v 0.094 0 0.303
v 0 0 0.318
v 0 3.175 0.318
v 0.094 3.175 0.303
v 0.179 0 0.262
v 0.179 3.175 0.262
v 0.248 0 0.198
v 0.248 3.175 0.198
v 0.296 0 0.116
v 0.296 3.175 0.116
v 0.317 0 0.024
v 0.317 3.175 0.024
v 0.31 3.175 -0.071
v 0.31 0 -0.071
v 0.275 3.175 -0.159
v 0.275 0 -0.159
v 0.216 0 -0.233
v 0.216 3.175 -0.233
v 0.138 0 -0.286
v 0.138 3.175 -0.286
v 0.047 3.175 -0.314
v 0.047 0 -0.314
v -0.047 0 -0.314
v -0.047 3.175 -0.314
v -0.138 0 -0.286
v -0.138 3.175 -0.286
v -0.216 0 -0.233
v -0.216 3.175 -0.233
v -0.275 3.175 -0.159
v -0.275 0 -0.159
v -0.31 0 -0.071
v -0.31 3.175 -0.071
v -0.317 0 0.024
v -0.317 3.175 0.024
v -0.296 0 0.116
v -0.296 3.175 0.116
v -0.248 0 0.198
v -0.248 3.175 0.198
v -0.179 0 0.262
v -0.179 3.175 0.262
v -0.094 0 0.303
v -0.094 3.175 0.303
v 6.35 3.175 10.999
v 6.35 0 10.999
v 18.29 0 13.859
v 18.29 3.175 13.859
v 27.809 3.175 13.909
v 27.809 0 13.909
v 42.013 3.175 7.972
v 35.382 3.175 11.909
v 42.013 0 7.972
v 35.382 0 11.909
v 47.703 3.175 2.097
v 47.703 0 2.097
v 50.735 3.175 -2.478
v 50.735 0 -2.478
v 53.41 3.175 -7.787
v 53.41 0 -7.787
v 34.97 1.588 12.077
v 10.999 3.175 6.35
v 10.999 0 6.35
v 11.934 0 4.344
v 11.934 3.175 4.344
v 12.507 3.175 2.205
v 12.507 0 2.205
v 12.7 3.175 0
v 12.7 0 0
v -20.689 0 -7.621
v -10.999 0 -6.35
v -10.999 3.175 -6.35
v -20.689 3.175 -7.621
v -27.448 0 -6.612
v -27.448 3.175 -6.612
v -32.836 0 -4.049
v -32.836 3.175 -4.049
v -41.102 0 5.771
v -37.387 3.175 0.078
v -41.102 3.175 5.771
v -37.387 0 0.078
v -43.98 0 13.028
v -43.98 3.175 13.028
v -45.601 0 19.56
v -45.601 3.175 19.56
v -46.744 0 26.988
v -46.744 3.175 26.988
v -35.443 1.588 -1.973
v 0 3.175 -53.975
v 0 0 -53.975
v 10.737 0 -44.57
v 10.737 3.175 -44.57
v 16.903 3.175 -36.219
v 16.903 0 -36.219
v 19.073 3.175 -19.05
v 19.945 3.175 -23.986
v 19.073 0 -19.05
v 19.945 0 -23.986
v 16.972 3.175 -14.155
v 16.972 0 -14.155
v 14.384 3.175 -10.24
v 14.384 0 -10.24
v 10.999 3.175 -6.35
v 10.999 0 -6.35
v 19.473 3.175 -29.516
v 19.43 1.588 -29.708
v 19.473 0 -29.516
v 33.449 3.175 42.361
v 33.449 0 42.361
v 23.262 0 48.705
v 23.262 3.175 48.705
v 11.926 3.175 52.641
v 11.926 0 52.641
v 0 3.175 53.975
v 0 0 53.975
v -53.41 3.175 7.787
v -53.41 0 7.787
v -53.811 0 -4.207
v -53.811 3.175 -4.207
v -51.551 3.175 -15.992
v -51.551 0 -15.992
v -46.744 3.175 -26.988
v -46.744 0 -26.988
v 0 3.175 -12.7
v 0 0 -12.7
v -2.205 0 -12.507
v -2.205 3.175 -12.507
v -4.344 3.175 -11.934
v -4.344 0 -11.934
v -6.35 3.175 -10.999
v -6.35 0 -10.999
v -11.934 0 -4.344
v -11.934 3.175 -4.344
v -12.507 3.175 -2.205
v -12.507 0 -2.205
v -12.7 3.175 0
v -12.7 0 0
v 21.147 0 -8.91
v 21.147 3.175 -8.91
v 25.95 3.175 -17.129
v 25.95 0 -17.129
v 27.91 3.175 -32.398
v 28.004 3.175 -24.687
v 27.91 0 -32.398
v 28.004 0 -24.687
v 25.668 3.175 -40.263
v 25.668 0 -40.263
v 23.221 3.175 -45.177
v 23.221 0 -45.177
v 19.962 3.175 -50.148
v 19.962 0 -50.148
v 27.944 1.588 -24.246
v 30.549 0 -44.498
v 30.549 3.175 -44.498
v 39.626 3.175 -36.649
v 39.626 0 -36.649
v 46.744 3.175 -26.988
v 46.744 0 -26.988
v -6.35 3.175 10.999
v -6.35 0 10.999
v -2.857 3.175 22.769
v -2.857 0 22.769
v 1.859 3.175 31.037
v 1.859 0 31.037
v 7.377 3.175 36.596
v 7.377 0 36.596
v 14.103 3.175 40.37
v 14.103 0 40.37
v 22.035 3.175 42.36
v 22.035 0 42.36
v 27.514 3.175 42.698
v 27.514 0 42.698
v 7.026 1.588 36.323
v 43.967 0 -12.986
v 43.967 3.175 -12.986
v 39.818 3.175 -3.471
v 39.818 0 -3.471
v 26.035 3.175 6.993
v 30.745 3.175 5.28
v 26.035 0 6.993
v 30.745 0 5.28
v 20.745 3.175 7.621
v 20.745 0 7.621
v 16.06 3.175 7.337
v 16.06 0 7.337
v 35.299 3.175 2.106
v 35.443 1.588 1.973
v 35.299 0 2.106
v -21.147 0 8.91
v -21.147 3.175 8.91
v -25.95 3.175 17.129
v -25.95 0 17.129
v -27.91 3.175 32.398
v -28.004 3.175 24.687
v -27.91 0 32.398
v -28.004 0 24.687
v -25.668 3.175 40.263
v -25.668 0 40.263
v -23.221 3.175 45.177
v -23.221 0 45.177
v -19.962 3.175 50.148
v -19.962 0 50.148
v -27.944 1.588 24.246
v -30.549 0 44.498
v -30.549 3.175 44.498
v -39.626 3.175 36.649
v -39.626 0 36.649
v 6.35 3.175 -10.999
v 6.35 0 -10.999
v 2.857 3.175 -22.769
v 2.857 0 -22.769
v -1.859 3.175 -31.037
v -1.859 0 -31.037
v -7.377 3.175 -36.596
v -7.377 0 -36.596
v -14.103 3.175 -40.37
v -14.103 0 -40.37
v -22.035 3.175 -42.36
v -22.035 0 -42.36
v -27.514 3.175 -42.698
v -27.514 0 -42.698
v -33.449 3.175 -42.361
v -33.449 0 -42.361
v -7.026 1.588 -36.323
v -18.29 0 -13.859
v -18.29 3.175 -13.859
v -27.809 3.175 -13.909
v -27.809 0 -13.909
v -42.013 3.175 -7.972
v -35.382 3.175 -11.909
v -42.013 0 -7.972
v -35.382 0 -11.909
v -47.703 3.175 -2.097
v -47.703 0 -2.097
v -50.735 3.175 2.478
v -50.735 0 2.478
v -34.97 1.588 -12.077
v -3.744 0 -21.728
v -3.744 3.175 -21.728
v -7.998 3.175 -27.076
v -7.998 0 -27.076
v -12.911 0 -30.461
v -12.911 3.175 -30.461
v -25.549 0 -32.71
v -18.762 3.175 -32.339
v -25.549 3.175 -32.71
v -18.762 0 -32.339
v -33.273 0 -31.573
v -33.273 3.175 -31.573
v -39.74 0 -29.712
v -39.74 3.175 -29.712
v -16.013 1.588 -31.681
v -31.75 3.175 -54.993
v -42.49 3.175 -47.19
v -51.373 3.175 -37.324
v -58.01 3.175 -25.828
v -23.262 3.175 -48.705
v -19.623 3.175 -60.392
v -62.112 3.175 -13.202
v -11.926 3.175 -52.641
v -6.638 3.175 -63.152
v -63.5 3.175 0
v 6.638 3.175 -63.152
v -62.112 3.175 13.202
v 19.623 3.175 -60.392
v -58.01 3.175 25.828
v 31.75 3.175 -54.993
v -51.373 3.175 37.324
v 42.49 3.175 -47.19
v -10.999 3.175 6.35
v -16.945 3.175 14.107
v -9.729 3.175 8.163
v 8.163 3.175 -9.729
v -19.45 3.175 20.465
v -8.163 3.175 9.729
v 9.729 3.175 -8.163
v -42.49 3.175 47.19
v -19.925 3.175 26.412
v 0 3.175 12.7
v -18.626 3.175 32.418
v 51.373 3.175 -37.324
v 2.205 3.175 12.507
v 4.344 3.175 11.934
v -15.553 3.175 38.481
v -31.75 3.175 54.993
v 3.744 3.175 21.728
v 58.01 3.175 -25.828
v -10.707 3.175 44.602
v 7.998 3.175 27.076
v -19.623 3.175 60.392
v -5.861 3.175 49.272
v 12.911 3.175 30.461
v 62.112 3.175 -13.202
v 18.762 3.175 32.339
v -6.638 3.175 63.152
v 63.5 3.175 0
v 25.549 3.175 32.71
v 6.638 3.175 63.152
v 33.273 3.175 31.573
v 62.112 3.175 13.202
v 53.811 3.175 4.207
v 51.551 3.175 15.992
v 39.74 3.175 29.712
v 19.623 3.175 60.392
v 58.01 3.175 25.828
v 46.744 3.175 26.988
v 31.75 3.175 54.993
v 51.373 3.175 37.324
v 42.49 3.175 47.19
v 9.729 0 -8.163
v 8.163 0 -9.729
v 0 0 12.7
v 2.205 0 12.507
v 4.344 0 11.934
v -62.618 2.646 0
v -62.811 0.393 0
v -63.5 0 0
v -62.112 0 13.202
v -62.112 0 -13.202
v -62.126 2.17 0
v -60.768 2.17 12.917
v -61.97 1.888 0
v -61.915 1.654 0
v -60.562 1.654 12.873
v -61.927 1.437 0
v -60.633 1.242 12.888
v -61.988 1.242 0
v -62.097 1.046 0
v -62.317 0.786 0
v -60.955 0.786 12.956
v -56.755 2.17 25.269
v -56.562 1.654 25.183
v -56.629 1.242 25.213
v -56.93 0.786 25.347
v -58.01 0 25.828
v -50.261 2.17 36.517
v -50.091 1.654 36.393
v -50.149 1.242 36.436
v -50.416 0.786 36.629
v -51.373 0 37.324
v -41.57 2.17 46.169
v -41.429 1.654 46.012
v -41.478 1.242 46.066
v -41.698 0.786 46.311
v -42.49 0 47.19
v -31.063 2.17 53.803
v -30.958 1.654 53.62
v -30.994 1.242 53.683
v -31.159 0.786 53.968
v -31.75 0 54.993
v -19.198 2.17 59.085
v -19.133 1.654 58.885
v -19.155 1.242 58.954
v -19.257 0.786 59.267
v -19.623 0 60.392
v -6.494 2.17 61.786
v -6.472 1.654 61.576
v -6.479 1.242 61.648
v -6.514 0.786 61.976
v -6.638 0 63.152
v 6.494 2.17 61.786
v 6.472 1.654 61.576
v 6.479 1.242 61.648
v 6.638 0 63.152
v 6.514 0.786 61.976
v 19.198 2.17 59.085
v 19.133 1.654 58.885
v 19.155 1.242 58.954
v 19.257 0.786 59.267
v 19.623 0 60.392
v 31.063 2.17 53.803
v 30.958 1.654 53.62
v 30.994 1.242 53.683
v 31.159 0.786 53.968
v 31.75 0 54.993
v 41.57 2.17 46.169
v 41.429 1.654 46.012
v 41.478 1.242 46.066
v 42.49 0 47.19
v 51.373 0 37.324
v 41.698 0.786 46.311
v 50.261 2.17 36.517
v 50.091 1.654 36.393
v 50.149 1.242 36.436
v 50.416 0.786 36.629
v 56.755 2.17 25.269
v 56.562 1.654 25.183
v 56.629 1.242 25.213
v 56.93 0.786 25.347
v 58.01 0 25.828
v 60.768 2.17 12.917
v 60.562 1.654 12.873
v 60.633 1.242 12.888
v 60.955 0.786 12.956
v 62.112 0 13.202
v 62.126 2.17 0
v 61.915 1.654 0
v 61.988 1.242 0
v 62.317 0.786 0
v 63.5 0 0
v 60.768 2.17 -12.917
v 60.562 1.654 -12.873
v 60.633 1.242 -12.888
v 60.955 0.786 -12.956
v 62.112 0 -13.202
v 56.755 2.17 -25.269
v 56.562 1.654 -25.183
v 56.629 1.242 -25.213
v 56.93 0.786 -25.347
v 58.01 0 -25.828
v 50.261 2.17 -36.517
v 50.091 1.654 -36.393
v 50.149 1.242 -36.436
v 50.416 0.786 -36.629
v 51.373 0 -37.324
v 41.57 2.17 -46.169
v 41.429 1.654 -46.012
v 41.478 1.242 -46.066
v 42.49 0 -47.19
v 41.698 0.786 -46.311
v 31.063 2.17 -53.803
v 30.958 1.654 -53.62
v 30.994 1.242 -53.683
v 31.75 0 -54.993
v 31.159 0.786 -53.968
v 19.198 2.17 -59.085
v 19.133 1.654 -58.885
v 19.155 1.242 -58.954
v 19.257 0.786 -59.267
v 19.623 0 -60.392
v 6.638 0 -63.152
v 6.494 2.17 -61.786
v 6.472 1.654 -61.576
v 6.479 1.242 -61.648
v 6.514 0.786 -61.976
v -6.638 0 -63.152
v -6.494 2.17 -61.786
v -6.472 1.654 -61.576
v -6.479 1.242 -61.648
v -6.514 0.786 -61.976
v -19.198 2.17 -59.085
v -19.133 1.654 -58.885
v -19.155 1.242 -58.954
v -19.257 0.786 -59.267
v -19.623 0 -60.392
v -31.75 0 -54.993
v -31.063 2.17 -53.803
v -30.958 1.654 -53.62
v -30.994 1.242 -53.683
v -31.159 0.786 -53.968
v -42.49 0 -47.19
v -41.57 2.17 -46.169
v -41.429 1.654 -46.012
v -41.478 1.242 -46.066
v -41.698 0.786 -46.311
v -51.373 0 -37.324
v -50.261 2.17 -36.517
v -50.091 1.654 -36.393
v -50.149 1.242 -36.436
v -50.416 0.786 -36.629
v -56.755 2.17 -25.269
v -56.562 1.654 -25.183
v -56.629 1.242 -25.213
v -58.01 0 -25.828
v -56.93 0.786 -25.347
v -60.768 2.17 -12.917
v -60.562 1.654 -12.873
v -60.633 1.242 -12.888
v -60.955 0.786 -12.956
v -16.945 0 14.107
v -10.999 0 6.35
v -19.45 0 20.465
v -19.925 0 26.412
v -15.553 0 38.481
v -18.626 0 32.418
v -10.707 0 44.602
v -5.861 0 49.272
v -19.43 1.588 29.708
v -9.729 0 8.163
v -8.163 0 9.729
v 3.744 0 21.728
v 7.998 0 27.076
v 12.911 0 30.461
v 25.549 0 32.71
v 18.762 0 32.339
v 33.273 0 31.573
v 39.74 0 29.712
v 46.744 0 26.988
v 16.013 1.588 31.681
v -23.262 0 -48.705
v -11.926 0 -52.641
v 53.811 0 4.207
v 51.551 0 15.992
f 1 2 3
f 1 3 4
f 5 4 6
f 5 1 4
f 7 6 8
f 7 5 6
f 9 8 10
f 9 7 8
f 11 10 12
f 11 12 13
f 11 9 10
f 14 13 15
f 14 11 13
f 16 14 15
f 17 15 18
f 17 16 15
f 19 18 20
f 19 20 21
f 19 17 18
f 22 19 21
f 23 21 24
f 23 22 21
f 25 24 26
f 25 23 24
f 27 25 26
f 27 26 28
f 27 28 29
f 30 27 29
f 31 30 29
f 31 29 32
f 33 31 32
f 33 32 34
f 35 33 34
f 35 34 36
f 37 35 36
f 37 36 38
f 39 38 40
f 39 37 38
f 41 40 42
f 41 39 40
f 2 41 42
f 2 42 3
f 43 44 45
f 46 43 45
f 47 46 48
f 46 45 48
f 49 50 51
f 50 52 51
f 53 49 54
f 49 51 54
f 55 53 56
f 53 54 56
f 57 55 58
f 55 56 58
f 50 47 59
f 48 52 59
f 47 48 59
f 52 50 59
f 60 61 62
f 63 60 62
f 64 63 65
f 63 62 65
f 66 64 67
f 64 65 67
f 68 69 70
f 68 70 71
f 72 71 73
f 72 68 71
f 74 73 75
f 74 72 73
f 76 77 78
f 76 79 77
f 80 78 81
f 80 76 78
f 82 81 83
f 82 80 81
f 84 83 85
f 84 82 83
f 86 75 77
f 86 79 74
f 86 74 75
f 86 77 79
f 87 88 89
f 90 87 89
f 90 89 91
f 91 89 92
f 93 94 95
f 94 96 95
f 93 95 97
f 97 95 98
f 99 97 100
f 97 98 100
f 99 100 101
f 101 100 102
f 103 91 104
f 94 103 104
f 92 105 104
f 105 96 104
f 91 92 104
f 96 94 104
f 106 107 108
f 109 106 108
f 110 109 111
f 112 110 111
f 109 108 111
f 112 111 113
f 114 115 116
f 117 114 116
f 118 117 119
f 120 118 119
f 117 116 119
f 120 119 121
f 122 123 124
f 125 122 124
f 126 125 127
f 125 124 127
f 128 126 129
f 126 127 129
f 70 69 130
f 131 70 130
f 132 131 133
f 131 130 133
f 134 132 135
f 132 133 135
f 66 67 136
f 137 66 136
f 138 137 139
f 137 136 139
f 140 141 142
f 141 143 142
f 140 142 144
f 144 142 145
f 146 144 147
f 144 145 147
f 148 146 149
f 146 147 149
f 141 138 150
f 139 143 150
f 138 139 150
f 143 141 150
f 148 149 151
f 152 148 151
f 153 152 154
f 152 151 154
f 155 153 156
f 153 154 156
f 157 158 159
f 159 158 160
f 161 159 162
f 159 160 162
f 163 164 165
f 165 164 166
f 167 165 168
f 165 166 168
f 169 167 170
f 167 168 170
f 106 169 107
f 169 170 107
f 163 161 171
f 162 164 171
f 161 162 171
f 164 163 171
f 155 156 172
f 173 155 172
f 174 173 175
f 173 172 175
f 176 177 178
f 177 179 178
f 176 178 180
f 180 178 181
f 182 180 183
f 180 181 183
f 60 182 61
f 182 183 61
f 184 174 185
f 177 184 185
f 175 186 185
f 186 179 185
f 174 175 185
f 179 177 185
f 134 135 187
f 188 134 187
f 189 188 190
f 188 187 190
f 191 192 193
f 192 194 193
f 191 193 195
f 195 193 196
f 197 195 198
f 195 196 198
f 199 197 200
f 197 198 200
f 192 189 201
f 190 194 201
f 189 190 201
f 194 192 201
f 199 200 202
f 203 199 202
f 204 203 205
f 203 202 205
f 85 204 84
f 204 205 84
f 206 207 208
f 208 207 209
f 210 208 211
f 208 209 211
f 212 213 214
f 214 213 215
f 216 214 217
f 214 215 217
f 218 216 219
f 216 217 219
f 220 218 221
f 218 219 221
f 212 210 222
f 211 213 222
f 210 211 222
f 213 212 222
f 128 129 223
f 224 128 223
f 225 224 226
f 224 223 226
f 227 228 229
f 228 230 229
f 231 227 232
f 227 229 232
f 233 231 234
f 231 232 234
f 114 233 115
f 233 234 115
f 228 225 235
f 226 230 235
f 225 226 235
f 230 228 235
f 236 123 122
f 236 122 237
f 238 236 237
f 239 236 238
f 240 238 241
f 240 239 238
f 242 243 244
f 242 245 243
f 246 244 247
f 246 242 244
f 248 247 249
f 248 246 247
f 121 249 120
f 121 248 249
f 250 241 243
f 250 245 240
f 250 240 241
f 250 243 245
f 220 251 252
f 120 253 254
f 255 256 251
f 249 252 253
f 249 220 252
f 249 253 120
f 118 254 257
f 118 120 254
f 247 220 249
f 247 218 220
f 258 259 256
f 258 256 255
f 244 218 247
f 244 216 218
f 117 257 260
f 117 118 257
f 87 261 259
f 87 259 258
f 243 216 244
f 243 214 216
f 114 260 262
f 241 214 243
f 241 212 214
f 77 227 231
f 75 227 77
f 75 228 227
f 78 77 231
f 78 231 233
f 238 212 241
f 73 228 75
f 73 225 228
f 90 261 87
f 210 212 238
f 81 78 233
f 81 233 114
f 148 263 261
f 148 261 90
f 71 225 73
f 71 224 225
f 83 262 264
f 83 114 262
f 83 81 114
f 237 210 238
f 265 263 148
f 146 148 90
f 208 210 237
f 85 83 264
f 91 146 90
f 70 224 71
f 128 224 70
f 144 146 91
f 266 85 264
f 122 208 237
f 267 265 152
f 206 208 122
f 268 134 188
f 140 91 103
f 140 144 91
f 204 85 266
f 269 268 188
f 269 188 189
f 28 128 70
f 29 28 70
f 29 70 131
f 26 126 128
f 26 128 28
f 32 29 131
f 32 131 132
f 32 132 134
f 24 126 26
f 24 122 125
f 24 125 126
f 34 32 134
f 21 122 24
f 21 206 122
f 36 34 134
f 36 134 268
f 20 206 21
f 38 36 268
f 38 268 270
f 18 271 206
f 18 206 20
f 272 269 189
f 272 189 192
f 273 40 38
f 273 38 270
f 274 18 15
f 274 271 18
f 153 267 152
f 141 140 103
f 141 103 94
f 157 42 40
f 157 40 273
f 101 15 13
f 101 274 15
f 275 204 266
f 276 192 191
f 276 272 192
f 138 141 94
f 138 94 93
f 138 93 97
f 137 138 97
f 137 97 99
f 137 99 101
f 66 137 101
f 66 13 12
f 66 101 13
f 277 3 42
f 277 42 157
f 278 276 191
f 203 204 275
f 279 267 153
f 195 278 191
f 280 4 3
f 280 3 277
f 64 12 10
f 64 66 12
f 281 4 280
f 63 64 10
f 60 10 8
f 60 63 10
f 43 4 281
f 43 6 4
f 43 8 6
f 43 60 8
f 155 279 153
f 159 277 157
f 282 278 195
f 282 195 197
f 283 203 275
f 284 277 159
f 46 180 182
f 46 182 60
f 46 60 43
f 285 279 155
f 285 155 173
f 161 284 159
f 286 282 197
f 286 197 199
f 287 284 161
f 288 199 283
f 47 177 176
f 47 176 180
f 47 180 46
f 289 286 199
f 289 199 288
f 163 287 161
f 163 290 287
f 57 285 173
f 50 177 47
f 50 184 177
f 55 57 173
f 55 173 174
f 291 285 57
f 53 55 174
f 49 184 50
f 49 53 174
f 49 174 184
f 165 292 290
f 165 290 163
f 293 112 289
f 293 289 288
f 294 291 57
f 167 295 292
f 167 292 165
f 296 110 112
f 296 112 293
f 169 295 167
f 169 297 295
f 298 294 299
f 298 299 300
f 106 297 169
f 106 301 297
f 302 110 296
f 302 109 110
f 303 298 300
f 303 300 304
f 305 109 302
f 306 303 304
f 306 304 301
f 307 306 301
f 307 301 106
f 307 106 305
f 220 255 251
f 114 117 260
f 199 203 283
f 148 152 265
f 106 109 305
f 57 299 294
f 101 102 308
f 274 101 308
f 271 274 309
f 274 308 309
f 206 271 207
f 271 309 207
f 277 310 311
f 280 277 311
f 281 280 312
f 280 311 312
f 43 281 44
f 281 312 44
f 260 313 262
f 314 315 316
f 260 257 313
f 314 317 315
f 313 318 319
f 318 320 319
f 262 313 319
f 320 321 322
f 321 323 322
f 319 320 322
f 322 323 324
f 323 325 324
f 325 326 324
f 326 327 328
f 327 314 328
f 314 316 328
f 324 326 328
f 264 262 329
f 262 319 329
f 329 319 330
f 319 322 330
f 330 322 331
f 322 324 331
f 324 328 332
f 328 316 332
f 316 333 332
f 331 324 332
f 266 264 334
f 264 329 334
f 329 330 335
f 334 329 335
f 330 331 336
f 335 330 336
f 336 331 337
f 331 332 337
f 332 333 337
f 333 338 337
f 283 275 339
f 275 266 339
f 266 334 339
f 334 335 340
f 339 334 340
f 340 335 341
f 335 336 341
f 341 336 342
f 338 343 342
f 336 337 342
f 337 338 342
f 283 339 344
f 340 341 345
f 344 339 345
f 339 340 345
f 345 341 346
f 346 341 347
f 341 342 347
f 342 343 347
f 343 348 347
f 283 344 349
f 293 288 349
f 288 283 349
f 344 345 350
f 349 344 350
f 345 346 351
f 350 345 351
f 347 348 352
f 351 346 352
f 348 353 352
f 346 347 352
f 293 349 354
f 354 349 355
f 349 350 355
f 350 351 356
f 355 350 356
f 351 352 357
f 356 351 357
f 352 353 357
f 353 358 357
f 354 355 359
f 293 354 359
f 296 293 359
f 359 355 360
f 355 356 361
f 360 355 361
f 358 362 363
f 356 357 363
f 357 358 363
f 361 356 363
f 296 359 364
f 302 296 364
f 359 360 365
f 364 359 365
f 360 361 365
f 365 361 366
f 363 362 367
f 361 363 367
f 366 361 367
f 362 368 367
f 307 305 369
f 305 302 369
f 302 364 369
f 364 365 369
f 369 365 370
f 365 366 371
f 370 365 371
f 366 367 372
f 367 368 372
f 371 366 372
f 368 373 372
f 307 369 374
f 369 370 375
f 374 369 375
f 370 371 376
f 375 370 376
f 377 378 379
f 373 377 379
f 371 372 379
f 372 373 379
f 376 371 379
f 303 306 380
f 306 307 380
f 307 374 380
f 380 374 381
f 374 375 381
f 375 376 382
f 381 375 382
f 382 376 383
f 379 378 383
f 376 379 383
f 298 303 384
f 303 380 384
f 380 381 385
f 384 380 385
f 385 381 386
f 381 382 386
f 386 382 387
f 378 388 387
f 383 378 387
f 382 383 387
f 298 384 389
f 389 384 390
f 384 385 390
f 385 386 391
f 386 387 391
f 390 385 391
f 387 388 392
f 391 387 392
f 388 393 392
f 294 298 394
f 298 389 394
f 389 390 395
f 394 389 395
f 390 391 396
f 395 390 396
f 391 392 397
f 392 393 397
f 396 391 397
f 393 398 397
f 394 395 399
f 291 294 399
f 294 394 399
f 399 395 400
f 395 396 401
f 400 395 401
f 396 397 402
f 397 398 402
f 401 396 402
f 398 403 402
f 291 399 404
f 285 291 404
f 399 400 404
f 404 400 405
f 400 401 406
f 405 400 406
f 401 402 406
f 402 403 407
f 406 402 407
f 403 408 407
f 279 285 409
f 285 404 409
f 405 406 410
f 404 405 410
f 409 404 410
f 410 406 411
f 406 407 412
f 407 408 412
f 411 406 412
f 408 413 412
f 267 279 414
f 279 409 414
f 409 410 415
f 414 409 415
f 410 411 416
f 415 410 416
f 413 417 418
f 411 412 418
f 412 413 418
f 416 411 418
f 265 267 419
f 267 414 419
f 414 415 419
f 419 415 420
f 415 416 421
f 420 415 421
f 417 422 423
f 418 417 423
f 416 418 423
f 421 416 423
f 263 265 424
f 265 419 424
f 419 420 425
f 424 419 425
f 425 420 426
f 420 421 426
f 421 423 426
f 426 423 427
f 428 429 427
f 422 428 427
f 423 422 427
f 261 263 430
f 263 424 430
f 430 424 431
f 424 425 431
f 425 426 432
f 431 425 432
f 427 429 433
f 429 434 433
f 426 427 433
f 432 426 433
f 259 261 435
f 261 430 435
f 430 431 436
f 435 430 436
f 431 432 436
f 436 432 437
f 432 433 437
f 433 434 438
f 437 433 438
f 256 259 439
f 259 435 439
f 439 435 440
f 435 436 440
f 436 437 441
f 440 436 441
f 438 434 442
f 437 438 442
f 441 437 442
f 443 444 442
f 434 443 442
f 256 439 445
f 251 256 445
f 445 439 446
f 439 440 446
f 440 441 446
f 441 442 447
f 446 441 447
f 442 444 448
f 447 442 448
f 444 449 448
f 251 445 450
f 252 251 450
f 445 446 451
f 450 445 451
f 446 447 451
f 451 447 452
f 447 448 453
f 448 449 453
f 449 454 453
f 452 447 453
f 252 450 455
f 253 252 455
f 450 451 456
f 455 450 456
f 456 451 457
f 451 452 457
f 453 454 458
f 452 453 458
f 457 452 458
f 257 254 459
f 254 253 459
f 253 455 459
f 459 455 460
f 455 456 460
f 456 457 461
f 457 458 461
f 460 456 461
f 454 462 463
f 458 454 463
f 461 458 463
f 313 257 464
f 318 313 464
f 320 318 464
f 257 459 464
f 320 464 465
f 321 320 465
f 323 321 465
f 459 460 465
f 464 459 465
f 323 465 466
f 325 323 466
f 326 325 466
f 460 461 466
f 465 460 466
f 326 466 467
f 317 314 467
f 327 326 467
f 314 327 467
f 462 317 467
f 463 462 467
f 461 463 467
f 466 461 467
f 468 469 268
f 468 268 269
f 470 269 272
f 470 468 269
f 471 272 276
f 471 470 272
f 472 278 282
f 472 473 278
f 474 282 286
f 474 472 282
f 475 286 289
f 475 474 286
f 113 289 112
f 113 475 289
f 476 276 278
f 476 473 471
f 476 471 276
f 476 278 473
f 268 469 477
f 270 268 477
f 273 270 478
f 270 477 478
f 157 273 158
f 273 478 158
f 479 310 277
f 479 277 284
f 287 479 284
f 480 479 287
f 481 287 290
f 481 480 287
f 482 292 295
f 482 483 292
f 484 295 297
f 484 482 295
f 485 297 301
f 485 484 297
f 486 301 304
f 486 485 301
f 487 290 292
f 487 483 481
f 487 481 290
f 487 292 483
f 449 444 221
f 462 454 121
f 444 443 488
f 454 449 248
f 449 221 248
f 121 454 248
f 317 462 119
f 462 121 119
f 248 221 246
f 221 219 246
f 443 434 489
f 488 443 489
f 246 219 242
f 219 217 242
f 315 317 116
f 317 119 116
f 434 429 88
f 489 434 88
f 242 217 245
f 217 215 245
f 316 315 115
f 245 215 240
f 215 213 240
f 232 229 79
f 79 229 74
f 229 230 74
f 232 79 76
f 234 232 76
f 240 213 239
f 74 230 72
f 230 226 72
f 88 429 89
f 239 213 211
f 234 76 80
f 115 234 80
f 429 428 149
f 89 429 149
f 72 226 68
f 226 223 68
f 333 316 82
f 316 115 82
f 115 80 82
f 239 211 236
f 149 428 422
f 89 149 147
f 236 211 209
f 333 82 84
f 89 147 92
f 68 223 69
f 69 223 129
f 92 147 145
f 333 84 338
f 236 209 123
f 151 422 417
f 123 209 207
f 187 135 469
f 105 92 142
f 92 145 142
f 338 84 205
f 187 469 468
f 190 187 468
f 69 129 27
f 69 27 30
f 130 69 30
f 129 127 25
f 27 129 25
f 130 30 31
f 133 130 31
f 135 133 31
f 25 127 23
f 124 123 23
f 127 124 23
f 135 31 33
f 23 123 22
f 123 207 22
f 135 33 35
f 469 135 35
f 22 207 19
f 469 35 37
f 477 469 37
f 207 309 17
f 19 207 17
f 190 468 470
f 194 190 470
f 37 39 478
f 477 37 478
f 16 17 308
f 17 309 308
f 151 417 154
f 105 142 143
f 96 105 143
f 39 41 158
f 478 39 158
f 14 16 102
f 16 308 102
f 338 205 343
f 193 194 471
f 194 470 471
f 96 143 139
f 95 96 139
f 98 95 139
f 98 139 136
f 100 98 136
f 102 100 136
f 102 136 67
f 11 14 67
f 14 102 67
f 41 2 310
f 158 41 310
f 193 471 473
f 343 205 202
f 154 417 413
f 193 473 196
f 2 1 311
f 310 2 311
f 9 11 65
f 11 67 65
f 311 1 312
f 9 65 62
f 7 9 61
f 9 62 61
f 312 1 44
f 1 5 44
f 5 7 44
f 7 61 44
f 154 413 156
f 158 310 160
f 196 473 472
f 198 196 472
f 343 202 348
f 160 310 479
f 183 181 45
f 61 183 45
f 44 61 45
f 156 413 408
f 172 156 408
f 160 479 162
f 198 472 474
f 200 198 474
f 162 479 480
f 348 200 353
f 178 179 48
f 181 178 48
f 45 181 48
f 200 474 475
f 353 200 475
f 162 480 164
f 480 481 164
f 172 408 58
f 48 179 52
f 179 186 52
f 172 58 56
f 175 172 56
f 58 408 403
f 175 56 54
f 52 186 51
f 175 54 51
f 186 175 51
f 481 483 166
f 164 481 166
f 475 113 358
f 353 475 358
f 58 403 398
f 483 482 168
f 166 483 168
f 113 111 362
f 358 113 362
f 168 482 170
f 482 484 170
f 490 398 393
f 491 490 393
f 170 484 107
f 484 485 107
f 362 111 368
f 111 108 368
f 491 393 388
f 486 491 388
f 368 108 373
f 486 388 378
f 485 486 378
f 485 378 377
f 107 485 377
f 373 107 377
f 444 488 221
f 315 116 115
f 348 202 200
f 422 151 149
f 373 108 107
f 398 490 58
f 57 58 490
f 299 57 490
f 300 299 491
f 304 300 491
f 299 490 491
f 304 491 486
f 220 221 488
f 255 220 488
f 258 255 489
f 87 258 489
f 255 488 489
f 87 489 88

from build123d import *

# Parameters (mm, degrees)
SKETCH1_R           = 63.5
SKETCH1_R_2         = 0.3175
BOSS_EXTRUDE1_DEPTH = 3.175


with BuildPart() as part:
    # Sketch1 → Boss-Extrude1 (new body)
    with BuildSketch(Plane(origin=(0, 0, 0), x_dir=(1, 0, 0), z_dir=(0, 1, 0))):
        with Locations(Location((0, 0, 0), (0, 0, 270))):
            Circle(SKETCH1_R)
        with Locations(Location((0, 0, 0), (0, 0, 270))):
            Circle(SKETCH1_R_2, mode=Mode.SUBTRACT)
        with BuildLine():
            ThreePointArc((0, 12.7), (-3.287001873, 12.267257994), (-6.35, 10.998522628))
            add(Edge.make_bspline(
                [(-6.35, 10.998522628), (-40.0597869, 22.548298823), (-53.410384867, -7.786617578)],
                knots=[0, 0, 0, 1, 1, 1], degree=2))
            ThreePointArc((-53.410384867, -7.786617578), (-53.009631694, 10.162655788), (-46.743721169, 26.9875))
            add(Edge.make_bspline(
                [(0, 12.7), (-8.654197439, 43.517475509), (-46.743721169, 26.9875)],
                knots=[0, 0, 0, 1, 1, 1], degree=2))
        make_face(mode=Mode.SUBTRACT)
        with BuildLine():
            add(Edge.make_bspline(
                [(-10.998522628, 6.35), (-42.014338018, 14.263982923), (-46.743721169, -26.9875)],
                knots=[0, 0, 0, 1, 1, 1], degree=2))
            ThreePointArc((-10.998522628, 6.35), (-12.267257994, 3.287001873), (-12.7, 0))
            add(Edge.make_bspline(
                [(-12.7, 0), (-39.557293043, -23.418643714), (-19.961783802, -50.14805891)],
                knots=[0, 0, 0, 1, 1, 1], degree=2))
            ThreePointArc((-19.961783802, -50.14805891), (-35.305933929, -40.826359798), (-46.743721169, -26.9875))
        make_face(mode=Mode.SUBTRACT)
        with BuildLine():
            add(Edge.make_bspline(
                [(-10.998522628, -6.35), (-33.36014058, -29.253492586), (0, -53.975)],
                knots=[0, 0, 0, 1, 1, 1], degree=2))
            ThreePointArc((-10.998522628, -6.35), (-8.980256121, -8.980256121), (-6.35, -10.998522628))
            add(Edge.make_bspline(
                [(-6.35, -10.998522628), (0.502493857, -45.966942537), (33.448601066, -42.361441332)],
                knots=[0, 0, 0, 1, 1, 1], degree=2))
            ThreePointArc((33.448601066, -42.361441332), (17.703697765, -50.989015586), (0, -53.975))
        make_face(mode=Mode.SUBTRACT)
        with BuildLine():
            add(Edge.make_bspline(
                [(0, -12.7), (8.654197439, -43.517475509), (46.743721169, -26.9875)],
                knots=[0, 0, 0, 1, 1, 1], degree=2))
            ThreePointArc((0, -12.7), (3.287001873, -12.267257994), (6.35, -10.998522628))
            add(Edge.make_bspline(
                [(6.35, -10.998522628), (40.0597869, -22.548298823), (53.410384867, 7.786617578)],
                knots=[0, 0, 0, 1, 1, 1], degree=2))
            ThreePointArc((53.410384867, 7.786617578), (53.009631694, -10.162655788), (46.743721169, -26.9875))
        make_face(mode=Mode.SUBTRACT)
        with BuildLine():
            add(Edge.make_bspline(
                [(46.743721169, 26.9875), (42.014338018, -14.263982923), (10.998522628, -6.35)],
                knots=[0.554750304, 0.554750304, 0.554750304, 1.554750304, 1.554750304, 1.554750304], degree=2))
            ThreePointArc((10.998522628, -6.35), (12.267257994, -3.287001873), (12.7, 0))
            add(Edge.make_bspline(
                [(12.7, 0), (39.557293043, 23.418643714), (19.961783802, 50.14805891)],
                knots=[0, 0, 0, 1, 1, 1], degree=2))
            ThreePointArc((19.961783802, 50.14805891), (35.305933929, 40.826359798), (46.743721169, 26.9875))
        make_face(mode=Mode.SUBTRACT)
        with BuildLine():
            add(Edge.make_bspline(
                [(0, 53.975), (33.36014058, 29.253492586), (10.998522628, 6.35)],
                knots=[0.274970858, 0.274970858, 0.274970858, 1.274970858, 1.274970858, 1.274970858], degree=2))
            ThreePointArc((10.998522628, 6.35), (8.980256121, 8.980256121), (6.35, 10.998522628))
            add(Edge.make_bspline(
                [(6.35, 10.998522628), (-0.502493857, 45.966942537), (-33.448601066, 42.361441332)],
                knots=[0, 0, 0, 1, 1, 1], degree=2))
            ThreePointArc((-33.448601066, 42.361441332), (-17.703697765, 50.989015586), (0, 53.975))
        make_face(mode=Mode.SUBTRACT)
    extrude(amount=BOSS_EXTRUDE1_DEPTH)

    # Sketch2 → Cut-Revolve2 (revolve, cut)
    with BuildSketch(Plane.XY):
        with BuildLine():
            Line((-63.5, 0), (-63.5, 3.175))
            add(Edge.make_bspline(
                [(-63.5, 3.175), (-60.325, 1.5875), (-63.5, 0)],
                knots=[0, 0, 0, 1, 1, 1], degree=2))
        make_face()
    revolve(axis=Axis((0, 0, 0), (0, 1, 0)), mode=Mode.SUBTRACT)


solid = part.part
